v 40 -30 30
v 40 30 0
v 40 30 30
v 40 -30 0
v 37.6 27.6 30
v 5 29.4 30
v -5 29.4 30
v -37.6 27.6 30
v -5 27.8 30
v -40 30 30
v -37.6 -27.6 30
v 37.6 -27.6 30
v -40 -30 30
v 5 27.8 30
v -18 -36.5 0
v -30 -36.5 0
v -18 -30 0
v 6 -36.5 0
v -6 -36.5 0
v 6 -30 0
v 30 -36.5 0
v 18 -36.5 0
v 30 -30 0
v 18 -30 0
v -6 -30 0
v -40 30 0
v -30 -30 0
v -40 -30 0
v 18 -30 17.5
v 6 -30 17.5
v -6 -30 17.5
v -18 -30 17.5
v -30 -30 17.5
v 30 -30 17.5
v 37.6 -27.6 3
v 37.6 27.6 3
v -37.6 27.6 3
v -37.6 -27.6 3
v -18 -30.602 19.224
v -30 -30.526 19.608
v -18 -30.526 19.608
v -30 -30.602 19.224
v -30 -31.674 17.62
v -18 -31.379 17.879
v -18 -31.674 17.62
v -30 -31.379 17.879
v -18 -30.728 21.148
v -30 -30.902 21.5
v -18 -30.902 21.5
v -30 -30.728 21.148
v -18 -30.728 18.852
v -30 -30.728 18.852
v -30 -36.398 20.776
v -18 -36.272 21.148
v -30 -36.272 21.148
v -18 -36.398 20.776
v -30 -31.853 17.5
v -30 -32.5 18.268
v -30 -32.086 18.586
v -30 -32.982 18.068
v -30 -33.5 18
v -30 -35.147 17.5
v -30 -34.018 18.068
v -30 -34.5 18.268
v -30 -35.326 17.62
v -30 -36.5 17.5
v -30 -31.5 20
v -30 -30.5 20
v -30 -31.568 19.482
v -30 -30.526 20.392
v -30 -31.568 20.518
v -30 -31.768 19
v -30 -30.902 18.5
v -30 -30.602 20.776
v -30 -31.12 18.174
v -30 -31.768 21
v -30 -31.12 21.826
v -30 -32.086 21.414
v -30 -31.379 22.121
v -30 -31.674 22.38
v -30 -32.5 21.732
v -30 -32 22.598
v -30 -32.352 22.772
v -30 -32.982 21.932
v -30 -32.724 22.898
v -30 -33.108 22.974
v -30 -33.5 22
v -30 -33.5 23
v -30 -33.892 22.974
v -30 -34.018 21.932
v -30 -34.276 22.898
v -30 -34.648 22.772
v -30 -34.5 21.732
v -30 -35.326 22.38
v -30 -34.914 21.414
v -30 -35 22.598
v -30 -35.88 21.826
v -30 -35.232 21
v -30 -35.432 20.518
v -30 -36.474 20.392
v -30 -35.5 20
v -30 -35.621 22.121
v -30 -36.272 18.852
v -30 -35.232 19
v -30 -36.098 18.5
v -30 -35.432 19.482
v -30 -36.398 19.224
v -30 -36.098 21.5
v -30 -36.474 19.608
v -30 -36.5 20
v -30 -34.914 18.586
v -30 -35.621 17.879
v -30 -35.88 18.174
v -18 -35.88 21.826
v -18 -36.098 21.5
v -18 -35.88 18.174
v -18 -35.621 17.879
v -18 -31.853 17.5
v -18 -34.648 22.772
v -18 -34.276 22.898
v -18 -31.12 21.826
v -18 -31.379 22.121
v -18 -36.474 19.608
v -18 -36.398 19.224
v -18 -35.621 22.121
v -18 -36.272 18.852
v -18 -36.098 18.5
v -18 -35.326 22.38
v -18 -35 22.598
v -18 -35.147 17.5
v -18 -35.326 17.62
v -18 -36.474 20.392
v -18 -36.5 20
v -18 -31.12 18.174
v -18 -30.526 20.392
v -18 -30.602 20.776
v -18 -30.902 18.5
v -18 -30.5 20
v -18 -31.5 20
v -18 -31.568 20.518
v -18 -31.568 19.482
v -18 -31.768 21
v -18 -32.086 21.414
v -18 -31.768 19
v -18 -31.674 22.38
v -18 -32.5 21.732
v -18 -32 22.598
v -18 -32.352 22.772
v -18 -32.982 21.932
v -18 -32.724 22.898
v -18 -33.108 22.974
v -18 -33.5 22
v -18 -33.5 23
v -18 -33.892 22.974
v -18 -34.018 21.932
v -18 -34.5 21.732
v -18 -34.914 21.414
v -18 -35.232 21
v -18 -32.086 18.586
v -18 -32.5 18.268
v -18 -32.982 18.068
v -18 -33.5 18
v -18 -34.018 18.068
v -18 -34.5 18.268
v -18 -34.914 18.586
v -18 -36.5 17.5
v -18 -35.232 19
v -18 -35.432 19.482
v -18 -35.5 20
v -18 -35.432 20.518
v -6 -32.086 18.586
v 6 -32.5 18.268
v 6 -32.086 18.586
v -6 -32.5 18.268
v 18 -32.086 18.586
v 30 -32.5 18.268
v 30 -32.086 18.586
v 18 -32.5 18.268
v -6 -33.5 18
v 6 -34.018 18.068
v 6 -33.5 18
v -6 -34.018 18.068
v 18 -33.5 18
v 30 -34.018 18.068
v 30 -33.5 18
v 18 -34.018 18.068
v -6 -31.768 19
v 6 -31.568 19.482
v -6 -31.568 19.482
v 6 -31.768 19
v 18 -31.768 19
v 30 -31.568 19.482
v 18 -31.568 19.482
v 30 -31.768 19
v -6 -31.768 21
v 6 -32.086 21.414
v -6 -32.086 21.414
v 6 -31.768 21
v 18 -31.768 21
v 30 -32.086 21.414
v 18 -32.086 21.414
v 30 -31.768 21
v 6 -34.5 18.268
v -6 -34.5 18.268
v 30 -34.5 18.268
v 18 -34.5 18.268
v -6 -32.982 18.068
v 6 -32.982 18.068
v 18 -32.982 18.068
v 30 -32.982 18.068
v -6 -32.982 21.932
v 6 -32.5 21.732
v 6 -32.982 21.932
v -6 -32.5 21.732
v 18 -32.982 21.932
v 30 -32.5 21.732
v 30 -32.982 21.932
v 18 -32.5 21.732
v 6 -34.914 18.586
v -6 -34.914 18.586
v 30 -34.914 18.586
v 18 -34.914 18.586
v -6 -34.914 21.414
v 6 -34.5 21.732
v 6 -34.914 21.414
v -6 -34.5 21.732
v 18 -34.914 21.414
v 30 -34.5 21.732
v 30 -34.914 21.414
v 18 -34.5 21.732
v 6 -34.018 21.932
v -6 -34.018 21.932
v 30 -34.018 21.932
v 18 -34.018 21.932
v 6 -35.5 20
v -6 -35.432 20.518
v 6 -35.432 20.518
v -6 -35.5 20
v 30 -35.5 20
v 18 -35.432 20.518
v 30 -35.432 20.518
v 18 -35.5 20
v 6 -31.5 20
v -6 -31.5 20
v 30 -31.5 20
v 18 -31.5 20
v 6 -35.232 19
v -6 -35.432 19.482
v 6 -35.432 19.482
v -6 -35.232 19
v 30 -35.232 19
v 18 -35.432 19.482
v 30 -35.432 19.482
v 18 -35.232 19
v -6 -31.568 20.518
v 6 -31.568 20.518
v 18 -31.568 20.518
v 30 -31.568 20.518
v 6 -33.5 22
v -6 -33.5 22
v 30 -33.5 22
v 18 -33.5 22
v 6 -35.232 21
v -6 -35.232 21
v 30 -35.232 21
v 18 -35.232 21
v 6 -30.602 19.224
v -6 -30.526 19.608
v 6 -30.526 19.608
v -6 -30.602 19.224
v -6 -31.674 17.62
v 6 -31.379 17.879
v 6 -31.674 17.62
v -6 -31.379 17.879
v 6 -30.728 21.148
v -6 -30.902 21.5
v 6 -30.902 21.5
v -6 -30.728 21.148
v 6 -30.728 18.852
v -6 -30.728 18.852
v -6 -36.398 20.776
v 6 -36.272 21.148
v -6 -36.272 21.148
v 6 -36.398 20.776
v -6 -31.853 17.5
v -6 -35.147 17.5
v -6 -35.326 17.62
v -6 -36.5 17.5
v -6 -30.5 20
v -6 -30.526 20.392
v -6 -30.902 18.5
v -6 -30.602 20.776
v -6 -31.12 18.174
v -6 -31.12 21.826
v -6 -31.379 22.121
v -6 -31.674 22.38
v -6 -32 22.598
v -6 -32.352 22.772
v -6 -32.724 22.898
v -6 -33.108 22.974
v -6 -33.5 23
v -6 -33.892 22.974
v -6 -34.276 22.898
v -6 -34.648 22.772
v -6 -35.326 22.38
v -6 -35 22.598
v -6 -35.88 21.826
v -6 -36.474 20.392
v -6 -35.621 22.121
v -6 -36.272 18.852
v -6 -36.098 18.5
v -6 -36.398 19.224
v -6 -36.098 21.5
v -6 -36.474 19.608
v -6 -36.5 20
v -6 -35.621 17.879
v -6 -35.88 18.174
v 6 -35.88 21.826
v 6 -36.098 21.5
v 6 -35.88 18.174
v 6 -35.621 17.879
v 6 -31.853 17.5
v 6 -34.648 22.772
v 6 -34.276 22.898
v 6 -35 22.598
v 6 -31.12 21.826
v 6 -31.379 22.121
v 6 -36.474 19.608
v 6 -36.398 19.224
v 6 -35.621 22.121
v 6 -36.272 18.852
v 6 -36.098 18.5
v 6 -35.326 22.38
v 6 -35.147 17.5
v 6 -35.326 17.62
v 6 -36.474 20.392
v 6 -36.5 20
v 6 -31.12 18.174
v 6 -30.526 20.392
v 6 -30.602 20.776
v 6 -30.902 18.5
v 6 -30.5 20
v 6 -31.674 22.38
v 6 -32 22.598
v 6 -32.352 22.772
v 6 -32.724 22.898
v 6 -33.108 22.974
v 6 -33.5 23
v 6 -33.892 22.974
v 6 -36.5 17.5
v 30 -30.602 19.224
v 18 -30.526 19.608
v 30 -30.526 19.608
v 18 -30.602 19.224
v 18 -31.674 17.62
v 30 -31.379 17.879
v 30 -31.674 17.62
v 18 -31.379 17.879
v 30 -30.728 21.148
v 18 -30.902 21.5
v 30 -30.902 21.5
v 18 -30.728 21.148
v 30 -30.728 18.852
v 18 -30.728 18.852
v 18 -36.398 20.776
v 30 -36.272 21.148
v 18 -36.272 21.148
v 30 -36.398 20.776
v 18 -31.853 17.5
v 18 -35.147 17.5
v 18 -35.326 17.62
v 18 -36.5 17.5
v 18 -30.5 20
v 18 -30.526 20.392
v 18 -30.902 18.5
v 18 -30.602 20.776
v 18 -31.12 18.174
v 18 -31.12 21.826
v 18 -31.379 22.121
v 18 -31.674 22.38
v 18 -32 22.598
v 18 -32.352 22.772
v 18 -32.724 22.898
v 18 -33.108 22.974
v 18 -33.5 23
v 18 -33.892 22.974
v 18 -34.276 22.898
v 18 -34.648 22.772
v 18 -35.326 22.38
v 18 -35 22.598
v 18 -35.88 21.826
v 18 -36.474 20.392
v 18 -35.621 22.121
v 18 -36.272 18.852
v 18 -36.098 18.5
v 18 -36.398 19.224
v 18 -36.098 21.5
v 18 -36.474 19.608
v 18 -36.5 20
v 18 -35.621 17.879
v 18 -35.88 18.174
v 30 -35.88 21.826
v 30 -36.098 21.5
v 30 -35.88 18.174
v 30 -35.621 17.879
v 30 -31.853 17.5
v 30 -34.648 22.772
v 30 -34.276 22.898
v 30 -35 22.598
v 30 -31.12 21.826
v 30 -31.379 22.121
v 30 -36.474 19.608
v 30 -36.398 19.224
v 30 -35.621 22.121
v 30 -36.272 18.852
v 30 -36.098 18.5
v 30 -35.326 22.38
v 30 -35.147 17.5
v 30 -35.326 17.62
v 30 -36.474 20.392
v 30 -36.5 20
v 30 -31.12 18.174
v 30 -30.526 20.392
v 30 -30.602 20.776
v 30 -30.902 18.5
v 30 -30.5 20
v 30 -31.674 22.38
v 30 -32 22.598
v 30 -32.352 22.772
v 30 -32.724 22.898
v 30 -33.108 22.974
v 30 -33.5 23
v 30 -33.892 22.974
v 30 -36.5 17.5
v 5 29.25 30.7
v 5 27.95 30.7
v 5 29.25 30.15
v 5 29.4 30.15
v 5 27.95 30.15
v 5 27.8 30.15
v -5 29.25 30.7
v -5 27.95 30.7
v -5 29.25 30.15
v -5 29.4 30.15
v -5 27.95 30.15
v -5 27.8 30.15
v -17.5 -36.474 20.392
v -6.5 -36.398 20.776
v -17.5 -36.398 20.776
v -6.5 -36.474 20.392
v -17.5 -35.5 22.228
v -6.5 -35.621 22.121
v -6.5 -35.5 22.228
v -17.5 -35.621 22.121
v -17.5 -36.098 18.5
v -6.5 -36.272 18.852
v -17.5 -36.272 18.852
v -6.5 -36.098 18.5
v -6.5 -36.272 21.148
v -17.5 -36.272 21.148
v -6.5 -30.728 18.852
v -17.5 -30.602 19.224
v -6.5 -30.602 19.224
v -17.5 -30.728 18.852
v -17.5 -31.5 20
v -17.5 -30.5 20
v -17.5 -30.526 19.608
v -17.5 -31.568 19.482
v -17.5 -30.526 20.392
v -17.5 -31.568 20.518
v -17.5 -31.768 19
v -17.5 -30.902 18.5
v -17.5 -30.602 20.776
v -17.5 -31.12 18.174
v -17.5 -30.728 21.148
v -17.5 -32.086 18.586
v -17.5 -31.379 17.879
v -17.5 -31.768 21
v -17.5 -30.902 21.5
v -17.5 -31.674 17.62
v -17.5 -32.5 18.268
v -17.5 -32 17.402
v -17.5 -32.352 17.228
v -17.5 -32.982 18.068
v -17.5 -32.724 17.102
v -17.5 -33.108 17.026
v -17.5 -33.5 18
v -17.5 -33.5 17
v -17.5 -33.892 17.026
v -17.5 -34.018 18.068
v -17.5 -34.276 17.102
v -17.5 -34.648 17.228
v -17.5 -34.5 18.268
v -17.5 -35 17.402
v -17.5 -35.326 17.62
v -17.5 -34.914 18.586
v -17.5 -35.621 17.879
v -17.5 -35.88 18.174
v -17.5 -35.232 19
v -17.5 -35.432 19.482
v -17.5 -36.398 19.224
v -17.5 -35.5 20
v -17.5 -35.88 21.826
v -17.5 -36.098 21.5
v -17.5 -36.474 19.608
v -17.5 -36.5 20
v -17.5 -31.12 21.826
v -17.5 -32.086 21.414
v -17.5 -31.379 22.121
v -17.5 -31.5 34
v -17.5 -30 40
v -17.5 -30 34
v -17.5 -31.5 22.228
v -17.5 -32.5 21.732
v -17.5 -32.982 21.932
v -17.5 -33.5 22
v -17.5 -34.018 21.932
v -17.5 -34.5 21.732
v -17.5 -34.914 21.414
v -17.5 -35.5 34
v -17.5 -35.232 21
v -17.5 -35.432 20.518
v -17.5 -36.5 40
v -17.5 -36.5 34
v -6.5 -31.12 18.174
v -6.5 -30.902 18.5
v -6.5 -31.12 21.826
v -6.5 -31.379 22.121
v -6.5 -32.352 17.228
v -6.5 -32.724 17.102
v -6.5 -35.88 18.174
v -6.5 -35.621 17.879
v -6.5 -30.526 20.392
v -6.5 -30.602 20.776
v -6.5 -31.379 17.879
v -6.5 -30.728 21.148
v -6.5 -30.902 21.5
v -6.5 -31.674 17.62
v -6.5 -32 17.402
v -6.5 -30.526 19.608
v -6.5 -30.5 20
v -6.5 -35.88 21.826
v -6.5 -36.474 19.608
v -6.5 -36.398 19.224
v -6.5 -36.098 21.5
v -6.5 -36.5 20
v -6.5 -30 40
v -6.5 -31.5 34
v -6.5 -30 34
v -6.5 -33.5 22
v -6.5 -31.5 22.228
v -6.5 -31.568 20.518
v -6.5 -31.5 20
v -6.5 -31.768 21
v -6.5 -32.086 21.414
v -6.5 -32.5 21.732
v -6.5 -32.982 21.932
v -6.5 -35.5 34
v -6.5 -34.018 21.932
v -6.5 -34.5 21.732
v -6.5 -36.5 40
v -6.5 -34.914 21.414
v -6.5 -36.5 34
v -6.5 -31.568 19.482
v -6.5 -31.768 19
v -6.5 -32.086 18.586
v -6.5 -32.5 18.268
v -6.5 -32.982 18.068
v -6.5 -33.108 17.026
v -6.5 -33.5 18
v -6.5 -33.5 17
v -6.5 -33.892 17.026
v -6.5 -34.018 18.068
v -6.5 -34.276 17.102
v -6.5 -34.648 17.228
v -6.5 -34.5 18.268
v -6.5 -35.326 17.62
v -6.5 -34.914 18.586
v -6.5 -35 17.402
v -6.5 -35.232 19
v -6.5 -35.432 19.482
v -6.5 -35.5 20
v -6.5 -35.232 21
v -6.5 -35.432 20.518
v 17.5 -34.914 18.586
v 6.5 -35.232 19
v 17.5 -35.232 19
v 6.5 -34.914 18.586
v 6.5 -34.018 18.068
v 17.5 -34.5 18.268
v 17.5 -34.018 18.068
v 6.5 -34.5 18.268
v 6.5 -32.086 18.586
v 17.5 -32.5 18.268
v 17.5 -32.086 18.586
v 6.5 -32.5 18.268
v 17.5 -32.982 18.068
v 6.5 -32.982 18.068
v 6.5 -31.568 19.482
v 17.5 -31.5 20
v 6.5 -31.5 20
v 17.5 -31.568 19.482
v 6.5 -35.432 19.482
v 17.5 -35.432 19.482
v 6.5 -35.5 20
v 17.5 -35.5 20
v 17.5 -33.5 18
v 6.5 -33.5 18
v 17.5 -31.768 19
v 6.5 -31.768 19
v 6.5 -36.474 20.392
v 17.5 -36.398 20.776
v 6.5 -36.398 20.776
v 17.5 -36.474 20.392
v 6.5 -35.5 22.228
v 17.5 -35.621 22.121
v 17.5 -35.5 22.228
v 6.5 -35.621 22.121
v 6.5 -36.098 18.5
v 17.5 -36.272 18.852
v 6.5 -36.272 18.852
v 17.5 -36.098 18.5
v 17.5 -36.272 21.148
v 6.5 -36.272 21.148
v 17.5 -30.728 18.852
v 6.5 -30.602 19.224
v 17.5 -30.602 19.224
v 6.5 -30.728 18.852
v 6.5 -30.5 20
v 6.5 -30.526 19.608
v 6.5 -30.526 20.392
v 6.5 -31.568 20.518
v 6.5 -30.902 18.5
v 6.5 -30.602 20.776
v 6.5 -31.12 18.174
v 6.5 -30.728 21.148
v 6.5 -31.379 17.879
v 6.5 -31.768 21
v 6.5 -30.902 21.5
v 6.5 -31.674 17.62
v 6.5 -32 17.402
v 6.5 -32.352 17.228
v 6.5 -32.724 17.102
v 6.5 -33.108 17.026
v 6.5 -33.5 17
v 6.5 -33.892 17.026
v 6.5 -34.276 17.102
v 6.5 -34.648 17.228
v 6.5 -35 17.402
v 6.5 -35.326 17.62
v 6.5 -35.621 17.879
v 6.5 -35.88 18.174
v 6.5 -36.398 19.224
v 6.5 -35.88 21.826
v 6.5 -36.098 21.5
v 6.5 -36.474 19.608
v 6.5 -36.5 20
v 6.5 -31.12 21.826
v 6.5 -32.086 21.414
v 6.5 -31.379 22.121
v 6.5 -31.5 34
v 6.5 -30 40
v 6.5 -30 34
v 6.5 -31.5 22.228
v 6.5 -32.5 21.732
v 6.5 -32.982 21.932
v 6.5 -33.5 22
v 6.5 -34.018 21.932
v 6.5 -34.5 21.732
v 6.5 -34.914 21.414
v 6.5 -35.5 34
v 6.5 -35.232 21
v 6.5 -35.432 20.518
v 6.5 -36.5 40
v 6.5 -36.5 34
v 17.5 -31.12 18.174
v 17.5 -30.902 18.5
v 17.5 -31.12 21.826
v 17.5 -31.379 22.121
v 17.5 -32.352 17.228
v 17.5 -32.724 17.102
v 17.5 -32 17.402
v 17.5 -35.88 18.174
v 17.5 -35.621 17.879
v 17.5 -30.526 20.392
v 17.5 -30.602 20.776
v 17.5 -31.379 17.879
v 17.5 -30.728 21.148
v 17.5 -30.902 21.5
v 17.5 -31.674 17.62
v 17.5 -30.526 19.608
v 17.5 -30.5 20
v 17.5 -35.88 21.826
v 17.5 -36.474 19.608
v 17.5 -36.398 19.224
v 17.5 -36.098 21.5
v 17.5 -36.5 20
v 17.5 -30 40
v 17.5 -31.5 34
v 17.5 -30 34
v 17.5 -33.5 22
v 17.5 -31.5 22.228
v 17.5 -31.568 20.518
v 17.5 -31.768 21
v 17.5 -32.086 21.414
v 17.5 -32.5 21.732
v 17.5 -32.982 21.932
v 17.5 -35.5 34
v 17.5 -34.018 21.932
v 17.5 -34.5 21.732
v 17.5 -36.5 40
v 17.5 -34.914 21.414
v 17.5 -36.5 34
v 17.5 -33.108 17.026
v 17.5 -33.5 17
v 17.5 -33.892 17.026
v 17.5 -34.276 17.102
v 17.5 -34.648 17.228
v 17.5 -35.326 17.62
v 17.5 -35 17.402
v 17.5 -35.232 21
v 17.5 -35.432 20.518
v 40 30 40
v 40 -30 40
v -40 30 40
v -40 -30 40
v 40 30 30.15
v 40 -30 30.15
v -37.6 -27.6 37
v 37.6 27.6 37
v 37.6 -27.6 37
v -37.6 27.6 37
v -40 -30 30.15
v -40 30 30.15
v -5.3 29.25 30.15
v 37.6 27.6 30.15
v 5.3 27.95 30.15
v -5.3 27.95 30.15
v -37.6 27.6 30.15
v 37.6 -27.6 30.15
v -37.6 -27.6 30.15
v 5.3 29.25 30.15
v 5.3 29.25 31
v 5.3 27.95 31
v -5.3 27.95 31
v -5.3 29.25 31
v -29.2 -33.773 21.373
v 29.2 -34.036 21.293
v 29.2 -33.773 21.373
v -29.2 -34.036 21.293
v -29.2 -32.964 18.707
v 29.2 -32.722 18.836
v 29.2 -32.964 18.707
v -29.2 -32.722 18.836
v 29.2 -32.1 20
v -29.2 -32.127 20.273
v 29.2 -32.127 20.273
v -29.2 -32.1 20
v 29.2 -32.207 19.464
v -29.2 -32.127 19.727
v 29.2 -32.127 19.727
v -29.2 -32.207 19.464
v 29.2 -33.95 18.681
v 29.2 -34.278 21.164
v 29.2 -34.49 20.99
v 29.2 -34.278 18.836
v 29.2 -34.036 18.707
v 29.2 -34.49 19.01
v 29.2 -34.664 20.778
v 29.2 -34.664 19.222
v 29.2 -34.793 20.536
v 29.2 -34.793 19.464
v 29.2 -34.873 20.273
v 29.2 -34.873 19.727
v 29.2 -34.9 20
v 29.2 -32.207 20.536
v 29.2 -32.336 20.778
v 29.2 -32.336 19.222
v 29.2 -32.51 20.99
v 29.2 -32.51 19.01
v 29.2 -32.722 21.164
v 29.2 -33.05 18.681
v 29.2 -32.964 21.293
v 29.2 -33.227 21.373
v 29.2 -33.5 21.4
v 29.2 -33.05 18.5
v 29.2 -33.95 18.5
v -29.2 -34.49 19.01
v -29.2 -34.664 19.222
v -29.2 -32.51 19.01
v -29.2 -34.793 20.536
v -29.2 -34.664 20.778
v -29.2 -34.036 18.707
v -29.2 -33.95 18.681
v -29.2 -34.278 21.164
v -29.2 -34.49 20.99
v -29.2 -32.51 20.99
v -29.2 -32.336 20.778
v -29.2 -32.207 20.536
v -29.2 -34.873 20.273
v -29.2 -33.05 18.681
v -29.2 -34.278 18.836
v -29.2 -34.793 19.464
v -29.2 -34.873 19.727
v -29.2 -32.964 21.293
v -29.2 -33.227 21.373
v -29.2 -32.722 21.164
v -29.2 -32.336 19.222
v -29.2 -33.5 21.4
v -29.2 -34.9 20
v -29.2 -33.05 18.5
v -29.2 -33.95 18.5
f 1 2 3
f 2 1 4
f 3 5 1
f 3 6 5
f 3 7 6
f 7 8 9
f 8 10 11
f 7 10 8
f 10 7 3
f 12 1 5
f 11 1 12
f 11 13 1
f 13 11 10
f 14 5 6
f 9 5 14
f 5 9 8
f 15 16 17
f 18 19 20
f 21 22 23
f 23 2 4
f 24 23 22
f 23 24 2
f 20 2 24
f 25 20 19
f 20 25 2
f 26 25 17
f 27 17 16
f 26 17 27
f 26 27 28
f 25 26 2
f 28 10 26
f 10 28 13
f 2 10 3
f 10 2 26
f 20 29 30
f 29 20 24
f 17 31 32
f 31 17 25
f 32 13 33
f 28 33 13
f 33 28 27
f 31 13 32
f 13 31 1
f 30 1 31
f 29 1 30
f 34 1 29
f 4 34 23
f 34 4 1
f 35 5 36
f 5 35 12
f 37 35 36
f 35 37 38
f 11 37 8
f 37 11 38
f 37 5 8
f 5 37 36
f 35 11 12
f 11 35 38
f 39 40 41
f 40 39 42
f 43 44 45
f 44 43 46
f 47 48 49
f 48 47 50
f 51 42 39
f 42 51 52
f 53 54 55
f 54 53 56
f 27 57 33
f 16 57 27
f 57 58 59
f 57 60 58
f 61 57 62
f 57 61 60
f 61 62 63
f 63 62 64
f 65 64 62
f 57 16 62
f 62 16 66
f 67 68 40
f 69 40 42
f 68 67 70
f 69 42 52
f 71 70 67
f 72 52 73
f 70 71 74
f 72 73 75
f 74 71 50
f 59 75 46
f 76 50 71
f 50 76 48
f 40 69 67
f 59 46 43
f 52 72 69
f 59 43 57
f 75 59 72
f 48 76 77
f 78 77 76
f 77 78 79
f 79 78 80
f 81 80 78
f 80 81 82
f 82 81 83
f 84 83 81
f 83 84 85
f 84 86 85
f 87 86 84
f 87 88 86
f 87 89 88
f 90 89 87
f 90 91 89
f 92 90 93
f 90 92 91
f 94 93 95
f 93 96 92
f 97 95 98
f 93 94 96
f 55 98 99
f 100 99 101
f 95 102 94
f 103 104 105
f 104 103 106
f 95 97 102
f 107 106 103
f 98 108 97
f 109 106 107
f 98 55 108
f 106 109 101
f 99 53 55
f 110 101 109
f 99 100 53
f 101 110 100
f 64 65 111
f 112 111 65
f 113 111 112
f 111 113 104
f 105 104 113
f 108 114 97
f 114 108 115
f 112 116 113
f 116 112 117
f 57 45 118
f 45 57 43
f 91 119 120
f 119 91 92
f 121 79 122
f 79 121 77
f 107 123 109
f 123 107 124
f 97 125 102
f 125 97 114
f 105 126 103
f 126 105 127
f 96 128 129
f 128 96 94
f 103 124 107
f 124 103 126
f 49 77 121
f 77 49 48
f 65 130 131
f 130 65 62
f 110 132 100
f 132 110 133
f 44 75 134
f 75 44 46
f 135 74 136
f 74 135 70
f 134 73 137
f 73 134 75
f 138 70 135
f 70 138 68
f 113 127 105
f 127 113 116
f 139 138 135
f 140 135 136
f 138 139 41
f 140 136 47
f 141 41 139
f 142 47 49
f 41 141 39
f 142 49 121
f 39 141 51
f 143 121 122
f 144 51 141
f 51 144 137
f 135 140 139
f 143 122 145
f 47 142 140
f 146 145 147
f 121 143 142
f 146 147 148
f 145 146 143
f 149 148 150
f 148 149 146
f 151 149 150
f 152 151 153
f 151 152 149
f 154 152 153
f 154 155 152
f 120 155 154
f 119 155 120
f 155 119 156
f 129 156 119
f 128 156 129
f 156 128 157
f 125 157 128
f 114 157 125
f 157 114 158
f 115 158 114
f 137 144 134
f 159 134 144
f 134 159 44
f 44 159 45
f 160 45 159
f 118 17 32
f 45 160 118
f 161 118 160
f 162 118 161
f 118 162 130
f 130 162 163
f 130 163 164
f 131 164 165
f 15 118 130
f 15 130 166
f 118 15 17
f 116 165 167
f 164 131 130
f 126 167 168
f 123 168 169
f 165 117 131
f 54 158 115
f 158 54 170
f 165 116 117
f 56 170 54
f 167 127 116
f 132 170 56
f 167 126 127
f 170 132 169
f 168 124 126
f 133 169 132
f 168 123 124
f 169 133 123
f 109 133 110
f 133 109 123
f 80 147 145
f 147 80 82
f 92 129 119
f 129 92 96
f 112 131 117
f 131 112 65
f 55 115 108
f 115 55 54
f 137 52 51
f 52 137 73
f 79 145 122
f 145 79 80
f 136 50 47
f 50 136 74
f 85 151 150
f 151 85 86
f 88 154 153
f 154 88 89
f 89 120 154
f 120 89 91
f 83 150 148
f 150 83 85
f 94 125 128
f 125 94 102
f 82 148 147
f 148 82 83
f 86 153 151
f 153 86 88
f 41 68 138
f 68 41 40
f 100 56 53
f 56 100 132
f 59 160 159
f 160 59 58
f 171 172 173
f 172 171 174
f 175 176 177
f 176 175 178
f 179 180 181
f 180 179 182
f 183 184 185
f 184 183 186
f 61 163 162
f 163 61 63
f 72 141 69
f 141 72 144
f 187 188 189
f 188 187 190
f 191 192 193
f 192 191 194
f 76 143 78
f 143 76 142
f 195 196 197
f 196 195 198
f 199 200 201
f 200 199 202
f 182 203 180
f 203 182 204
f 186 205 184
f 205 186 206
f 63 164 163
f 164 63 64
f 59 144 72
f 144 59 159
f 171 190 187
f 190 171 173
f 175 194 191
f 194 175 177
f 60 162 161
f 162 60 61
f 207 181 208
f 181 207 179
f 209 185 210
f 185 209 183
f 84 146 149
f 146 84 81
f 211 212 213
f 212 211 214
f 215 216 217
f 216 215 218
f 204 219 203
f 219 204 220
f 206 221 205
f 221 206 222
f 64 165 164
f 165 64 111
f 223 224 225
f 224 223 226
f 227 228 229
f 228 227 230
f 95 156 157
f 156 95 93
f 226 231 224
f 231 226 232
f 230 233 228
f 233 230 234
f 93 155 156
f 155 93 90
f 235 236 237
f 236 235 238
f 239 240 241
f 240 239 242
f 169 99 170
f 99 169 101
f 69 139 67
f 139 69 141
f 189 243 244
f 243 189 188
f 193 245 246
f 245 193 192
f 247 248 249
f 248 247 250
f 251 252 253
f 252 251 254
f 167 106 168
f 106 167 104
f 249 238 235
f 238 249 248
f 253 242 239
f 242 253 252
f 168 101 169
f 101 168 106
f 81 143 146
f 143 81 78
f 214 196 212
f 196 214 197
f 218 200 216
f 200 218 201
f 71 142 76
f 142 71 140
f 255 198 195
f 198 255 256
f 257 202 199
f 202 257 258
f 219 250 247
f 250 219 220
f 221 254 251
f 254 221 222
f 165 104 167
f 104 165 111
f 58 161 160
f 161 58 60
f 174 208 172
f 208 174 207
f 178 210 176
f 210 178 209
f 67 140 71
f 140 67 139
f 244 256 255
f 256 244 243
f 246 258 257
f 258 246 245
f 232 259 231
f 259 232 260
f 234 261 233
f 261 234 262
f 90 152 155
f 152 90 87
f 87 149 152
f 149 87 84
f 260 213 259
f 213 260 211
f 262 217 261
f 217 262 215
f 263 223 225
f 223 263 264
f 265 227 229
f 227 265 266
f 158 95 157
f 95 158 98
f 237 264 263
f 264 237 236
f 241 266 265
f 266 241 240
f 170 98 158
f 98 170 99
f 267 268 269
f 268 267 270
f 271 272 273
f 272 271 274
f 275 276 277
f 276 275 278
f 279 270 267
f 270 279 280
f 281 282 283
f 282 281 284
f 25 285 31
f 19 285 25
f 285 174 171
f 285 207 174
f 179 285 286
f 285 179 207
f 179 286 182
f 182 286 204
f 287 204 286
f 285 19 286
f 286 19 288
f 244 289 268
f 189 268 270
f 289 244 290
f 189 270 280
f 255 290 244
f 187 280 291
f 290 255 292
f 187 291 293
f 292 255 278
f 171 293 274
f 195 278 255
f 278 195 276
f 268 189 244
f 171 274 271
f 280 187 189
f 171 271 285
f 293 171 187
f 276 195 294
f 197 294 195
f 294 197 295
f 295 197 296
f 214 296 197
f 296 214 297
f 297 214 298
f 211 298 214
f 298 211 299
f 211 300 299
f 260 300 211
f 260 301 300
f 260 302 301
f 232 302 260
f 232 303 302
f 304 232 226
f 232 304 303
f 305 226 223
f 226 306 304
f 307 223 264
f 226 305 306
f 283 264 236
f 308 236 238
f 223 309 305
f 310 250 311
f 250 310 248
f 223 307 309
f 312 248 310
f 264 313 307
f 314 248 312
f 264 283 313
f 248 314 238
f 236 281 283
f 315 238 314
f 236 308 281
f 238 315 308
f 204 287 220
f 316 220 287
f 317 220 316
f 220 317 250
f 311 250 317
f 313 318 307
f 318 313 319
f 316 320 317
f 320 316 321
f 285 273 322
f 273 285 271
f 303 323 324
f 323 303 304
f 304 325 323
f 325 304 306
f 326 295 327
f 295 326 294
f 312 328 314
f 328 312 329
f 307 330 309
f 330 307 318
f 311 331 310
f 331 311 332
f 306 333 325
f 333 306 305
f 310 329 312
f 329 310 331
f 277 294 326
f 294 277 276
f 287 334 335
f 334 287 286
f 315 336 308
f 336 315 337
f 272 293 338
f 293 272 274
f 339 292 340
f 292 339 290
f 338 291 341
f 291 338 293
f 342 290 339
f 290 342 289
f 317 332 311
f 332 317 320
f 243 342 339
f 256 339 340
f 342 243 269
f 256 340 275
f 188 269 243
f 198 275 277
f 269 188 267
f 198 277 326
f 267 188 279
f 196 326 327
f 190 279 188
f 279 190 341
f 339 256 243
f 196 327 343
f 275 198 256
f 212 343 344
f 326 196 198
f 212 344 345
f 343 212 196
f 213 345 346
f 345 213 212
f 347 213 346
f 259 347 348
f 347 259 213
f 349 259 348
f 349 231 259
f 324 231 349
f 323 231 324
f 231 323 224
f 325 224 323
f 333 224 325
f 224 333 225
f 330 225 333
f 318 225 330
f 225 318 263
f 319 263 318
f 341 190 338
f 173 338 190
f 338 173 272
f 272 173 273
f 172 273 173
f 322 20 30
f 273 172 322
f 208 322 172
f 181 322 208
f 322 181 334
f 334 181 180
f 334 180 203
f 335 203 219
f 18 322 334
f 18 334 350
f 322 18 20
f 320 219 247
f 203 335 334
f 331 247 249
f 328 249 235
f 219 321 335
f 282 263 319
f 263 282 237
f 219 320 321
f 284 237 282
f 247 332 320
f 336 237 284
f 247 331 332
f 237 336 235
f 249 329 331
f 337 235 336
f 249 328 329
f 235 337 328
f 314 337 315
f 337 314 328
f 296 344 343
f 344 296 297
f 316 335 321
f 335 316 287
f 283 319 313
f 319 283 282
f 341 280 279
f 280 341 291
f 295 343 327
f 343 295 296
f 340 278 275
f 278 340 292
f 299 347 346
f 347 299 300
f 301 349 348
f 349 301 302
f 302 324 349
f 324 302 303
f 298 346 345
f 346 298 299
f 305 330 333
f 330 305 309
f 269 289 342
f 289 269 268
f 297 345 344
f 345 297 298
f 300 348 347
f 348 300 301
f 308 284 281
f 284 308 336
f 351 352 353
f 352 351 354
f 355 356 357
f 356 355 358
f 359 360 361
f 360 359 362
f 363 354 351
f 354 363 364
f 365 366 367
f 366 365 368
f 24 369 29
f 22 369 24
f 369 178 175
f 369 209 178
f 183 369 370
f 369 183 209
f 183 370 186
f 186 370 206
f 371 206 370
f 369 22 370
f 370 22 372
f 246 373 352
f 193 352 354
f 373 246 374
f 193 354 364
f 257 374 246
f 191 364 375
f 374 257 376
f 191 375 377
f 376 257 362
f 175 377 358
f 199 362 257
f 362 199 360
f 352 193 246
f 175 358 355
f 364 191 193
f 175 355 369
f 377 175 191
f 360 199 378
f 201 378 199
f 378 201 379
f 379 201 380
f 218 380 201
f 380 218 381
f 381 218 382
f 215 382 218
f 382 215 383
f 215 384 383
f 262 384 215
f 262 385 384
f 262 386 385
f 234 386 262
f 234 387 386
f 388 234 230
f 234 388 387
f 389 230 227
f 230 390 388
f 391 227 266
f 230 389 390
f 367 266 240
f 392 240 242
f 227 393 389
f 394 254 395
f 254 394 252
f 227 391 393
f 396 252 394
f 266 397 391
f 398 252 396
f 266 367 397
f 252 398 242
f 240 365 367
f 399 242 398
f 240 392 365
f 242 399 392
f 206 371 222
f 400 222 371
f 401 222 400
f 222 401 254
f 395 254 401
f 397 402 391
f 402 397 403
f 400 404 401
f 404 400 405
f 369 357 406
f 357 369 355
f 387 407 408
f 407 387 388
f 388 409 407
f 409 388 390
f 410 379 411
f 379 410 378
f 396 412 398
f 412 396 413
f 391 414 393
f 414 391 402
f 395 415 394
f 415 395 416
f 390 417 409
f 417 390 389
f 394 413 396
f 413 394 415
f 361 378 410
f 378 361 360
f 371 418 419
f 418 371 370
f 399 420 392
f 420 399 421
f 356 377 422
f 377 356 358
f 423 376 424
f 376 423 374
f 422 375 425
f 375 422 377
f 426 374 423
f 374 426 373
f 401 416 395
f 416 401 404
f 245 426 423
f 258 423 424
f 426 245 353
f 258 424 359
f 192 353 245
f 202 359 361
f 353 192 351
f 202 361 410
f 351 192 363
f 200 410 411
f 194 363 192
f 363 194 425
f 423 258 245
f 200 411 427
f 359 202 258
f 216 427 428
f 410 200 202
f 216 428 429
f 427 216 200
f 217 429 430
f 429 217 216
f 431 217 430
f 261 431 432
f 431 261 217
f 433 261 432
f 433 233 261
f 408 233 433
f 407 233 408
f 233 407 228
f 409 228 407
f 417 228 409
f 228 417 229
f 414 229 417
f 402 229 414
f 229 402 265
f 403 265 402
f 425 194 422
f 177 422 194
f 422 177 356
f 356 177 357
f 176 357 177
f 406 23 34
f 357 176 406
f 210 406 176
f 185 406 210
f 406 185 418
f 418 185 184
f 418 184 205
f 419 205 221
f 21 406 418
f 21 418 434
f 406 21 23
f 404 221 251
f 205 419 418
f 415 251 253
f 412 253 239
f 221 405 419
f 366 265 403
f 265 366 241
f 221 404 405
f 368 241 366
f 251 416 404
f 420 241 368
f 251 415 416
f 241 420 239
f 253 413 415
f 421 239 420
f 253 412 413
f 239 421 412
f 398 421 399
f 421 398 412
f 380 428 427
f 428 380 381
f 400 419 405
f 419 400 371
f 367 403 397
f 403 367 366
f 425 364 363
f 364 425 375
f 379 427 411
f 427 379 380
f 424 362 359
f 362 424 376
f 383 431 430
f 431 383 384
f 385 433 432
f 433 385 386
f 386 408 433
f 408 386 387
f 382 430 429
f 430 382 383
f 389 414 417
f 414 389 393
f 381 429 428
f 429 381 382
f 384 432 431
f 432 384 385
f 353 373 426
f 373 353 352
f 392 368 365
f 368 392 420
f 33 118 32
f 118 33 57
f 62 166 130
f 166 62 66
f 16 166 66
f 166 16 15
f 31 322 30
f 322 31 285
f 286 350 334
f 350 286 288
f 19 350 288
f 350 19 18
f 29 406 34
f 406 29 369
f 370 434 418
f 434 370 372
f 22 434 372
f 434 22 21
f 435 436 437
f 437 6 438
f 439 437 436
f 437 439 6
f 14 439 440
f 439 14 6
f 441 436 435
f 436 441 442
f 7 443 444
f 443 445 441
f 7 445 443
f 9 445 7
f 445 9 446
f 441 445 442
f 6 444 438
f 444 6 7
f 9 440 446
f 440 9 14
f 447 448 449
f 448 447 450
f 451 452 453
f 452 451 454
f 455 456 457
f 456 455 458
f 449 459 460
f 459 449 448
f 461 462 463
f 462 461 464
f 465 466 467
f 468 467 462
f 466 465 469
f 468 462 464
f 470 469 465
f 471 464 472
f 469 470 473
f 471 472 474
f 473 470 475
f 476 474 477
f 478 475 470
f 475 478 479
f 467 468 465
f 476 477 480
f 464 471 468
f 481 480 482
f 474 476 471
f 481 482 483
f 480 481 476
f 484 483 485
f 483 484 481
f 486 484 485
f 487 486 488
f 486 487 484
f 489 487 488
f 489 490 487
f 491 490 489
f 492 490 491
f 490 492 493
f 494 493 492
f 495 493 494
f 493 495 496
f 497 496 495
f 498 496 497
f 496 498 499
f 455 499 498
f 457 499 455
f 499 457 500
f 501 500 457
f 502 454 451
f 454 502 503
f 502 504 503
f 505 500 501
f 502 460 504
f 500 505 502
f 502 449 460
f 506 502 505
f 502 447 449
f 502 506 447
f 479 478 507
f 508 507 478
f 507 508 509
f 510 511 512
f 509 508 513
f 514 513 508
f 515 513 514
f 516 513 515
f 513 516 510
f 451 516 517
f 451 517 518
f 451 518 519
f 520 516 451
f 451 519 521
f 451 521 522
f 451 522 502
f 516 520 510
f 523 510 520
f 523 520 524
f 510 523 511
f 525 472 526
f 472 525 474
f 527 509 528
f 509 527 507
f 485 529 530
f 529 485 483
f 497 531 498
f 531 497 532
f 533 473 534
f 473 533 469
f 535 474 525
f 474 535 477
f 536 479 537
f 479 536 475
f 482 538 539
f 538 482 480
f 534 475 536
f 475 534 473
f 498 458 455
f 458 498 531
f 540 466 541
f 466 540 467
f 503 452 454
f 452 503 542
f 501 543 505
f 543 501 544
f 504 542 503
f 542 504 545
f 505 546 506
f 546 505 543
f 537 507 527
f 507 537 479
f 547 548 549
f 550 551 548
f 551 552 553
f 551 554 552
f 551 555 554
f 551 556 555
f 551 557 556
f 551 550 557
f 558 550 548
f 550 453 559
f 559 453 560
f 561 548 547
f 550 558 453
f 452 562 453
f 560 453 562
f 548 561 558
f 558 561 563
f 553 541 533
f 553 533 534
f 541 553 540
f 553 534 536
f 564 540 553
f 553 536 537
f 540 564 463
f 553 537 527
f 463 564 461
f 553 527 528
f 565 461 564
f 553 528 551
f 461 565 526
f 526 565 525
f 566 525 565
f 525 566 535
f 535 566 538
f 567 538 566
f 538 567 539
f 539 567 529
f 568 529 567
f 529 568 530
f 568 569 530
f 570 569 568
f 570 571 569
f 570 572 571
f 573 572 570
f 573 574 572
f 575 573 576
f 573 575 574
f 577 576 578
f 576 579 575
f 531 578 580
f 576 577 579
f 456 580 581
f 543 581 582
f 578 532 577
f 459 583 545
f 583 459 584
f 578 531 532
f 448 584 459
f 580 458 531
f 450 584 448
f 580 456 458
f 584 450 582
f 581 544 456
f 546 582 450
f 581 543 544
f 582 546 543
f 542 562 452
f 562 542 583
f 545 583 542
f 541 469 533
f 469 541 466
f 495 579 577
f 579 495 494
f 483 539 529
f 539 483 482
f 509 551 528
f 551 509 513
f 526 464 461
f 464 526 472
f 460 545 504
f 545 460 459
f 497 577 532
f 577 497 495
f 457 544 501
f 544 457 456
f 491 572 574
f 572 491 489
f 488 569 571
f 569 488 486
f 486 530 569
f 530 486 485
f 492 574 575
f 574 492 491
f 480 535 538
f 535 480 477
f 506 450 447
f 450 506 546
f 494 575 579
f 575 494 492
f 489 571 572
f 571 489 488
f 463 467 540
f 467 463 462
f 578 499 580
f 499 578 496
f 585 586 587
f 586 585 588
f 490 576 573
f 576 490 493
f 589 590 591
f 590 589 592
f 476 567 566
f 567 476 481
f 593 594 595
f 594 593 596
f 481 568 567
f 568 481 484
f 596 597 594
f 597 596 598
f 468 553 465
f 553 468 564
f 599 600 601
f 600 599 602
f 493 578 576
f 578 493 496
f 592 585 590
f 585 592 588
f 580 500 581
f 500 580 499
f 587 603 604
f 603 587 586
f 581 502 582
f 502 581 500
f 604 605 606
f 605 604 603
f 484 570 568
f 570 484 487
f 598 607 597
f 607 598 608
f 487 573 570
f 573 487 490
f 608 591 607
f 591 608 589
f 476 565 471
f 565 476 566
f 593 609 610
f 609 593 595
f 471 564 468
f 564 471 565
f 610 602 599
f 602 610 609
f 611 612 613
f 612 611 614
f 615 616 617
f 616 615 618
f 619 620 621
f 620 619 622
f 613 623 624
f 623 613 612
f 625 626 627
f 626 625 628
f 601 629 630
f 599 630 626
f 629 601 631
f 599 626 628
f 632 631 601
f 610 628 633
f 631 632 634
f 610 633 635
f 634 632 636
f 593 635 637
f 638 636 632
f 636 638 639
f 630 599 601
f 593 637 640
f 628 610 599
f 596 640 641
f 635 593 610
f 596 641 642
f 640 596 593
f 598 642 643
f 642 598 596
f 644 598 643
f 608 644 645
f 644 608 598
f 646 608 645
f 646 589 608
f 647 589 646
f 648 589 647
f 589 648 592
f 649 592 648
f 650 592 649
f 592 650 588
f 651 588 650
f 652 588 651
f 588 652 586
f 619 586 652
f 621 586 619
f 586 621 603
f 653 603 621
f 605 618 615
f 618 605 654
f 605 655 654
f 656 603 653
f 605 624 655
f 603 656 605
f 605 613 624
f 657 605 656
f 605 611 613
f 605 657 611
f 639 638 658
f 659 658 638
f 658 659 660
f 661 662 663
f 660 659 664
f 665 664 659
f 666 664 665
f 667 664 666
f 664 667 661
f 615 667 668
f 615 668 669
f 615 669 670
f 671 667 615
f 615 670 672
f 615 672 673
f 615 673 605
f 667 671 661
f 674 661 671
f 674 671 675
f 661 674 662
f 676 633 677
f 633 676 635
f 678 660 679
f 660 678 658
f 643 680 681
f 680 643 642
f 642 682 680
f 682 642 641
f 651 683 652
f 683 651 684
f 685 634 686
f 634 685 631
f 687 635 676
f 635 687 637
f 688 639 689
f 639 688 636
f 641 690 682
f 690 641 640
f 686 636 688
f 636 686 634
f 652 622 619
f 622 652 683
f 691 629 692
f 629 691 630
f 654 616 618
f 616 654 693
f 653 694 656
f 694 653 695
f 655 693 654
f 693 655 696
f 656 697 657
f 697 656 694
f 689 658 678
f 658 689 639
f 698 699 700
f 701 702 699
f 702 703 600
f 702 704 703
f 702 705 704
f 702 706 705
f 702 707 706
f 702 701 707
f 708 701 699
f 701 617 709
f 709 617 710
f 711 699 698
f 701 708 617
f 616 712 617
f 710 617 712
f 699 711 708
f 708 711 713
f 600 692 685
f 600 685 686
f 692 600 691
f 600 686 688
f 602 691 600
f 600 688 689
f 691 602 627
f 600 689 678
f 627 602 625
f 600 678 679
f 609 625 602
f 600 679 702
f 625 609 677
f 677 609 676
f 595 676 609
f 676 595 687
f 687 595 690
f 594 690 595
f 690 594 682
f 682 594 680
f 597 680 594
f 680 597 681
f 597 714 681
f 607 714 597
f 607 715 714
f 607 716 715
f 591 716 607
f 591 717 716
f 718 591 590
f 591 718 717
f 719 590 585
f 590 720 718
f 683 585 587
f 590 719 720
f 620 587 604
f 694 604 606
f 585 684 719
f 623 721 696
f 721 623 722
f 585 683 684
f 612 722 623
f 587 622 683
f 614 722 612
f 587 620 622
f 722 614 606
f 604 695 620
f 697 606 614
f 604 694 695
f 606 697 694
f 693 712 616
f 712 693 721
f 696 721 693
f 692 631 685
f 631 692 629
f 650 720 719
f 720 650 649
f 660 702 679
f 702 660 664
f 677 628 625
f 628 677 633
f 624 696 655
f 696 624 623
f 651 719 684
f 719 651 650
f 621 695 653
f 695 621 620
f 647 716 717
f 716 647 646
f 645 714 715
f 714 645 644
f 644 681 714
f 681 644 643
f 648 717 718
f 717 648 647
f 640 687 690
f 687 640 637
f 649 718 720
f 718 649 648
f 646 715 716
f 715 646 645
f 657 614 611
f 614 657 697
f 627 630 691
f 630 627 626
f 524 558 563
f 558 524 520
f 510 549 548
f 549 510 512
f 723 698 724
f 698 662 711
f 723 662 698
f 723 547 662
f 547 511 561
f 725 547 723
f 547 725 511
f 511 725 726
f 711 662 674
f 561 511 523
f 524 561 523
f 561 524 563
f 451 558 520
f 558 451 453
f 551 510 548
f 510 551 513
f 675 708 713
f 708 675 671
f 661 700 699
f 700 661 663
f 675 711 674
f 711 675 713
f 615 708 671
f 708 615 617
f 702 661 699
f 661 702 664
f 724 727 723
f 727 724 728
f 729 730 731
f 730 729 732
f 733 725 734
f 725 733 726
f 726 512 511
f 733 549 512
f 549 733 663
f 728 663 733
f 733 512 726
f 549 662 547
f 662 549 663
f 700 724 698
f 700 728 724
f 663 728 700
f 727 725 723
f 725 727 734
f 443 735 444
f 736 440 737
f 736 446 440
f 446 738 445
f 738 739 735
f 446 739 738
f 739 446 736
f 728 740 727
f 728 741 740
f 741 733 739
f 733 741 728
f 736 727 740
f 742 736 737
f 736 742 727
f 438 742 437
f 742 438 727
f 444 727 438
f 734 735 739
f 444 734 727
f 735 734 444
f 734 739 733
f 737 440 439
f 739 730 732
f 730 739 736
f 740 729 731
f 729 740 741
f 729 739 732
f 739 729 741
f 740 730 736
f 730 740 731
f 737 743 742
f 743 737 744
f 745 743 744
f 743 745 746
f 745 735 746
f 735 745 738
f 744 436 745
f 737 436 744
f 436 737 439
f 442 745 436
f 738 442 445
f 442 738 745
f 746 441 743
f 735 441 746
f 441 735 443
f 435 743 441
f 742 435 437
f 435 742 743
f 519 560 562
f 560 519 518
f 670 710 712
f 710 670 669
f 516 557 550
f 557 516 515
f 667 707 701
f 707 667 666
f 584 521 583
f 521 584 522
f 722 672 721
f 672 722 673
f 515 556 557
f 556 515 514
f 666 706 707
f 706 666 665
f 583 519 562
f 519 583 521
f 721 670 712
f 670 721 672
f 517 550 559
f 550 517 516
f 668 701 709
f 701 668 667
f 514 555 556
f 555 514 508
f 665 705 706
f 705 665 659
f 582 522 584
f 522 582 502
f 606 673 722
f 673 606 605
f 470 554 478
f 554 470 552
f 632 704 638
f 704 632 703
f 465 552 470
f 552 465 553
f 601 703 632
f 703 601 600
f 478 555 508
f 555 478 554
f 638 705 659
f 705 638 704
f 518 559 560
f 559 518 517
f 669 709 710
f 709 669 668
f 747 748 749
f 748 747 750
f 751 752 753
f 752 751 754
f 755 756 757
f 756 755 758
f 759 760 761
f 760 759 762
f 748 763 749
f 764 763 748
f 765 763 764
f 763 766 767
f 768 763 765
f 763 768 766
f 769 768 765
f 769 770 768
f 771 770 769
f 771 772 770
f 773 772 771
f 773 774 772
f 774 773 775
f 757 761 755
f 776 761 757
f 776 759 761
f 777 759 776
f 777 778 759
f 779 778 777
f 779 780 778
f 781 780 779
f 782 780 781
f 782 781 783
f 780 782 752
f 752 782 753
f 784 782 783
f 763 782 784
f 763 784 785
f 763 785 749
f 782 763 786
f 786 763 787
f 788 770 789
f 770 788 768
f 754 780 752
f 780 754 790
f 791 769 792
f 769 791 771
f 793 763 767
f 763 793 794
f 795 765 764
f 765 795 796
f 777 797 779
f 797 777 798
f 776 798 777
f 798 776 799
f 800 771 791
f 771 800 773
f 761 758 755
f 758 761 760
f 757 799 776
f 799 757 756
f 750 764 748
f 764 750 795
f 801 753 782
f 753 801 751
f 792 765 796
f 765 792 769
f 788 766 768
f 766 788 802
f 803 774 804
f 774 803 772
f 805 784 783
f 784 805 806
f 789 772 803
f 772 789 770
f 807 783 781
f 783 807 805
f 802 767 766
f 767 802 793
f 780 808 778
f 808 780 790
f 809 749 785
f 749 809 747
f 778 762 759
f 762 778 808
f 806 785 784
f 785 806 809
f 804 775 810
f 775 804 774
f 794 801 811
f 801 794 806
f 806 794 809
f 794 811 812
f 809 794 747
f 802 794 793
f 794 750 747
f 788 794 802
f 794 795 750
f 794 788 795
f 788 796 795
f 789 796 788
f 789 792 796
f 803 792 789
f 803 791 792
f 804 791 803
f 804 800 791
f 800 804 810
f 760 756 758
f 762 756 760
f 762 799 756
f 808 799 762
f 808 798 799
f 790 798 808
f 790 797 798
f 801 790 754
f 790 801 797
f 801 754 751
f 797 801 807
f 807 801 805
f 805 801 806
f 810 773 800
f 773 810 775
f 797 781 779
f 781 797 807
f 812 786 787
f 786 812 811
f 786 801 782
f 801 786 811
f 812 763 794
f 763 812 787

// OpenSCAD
part = "assembly"; // [base, lid, pin, assembly]
cadverify_only = "";
module instance(name, part, unit = 1) {
  echo(cadverify_instance = [name, part, unit]);
  if (cadverify_only == "" || cadverify_only == name) children();
}
Ya = -33.5; Za = 20; Kr = 3.0; Br = 2.0; Pr = 1.4;
BX = [[-30,-18],[-6,6],[18,30]];
LX = [[-17.5,-6.5],[6.5,17.5]];
module barrelX(x0, x1) {
  difference() {
    translate([0,Ya,Za]) rotate([0,90,0]) translate([0,0,(x0+x1)/2])
      cylinder(h=x1-x0, r=Kr, center=true, $fn=48);
    translate([0,Ya,Za]) rotate([0,90,0]) translate([0,0,(x0+x1)/2])
      cylinder(h=(x1-x0)+1.0, r=Br, center=true, $fn=24);
  }
}
module base_geom() {
  difference() {
    union() {
      difference() {
        translate([-40,-30,0]) cube([80,60,30]);
        translate([-37.6,-27.6,3]) cube([75.2,55.2,27.01]);
      }
      for (b=BX) {
        translate([b[0],-36.5,0]) cube([b[1]-b[0],6.5,17.5]);
        barrelX(b[0], b[1]);
      }
      translate([-5,27.8,30]) cube([10,1.6,0.7]);
    }
    translate([0,Ya,Za]) rotate([0,90,0]) translate([0,0,0])
      cylinder(h=62, r=Br, center=true, $fn=24);
  }
}
module lid_open() {
  difference() {
    union() {
      translate([-40,-97,0]) cube([80,60,3]);
      translate([-40,-97,3]) cube([80,2.4,6.85]);
      translate([-40,-39.4,3]) cube([80,2.4,6.85]);
      translate([-40,-97,3]) cube([2.4,60,6.85]);
      translate([37.6,-97,3]) cube([2.4,60,6.85]);
      for (b=LX) {
        translate([b[0],-39,0]) cube([b[1]-b[0],8.5,6]);
        translate([b[0],-35.5,3]) cube([b[1]-b[0],4,17.5]);
        barrelX(b[0], b[1]);
      }
    }
    translate([-5.3,-96.25,9.0]) cube([10.6,1.3,1.1]);
    translate([0,Ya,Za]) rotate([0,90,0]) translate([0,0,0])
      cylinder(h=62, r=Br, center=true, $fn=24);
  }
}
module pin_geom() {
  union() {
    translate([-29.2,0,1.5]) rotate([0,90,0])
      cylinder(h=58.4, r=Pr, center=false, $fn=32);
    translate([-29.2,-0.45,0]) cube([58.4,0.9,0.4]);
  }
}
module lid_closed() {
  translate([0,Ya,Za]) rotate([180,0,0]) translate([0,-Ya,-Za]) lid_open();
}
module pin_placed() {
  translate([0,Ya,Za-1.5]) pin_geom();
}
if (part=="base") {
  base_geom();
  echo(cadverify_spec=[
    ["bounds", [[-40,-36.5,0],[40,30,30.7]]],
    ["bodies", 1],
    ["support_faces", [["base","-z",4000]]],
    ["overhangs_allowed", [["hinge", [[-30,-37,16],[30,-30,24]]]]],
    ["copies", 1],
    ["details", [
      ["bottom","thickness",[0,0,-1],[0,0,1],3],
      ["cavity","void",[[-37.6,-27.6,3],[37.6,27.6,30]],0.9],
      ["knuckle","material",[[-30,-36.5,17],[-18,-30.5,23]],0.4],
      ["bore","hole",[-31,-33.5,20],[1,0,0],[[0,4.0],[10,4.0]]],
      ["catch","material",[[-5,27.8,30],[5,29.4,30.7]],0.6]
    ]]
  ]);
} else if (part=="lid") {
  lid_open();
  echo(cadverify_spec=[
    ["bounds", [[-40,-97,0],[40,-30.5,23]]],
    ["bodies", 1],
    ["support_faces", [["lid","-z",4000]]],
    ["overhangs_allowed", [["hinge", [[-30,-37,16],[30,-30,24]]]]],
    ["copies", 1],
    ["details", [
      ["plate","thickness",[0,-67,-1],[0,0,1],3],
      ["pocket","void",[[-37.6,-94.6,3],[37.6,-39.4,9.85]],0.9],
      ["knuckle","material",[[-17.5,-36.5,17],[-6.5,-30.5,23]],0.4],
      ["bore","hole",[-18,-33.5,20],[1,0,0],[[0,4.0],[9,4.0]]],
      ["notch","void",[[-5.3,-96.25,9.0],[5.3,-94.95,10.1]],0.9]
    ]]
  ]);
} else if (part=="pin") {
  pin_geom();
  echo(cadverify_spec=[
    ["bounds", [[-29.2,-1.4,0],[29.2,1.4,2.9]]],
    ["bodies", 1],
    ["support_faces", [["pin","-z",50]]],
    ["overhangs_allowed", [["pinFlankA", [[-29.3,-1.1,0.2],[29.3,-0.8,0.6]]],["pinFlankB", [[-29.3,0.8,0.2],[29.3,1.1,0.6]]]]],
    ["copies", 1],
    ["details", [
      ["shaft","thickness",[0,5,1.5],[0,-1,0],2.8],
      ["fin","thickness",[0,0,-1],[0,0,1],2.9]
    ]]
  ]);
} else {
  instance("base","base") base_geom();
  instance("lid","lid") lid_closed();
  instance("pin","pin") pin_placed();
  echo(cadverify_spec=[
    ["bounds", [[-40,-36.5,0],[40,30,40]]],
    ["support_faces", [["bed","-z",4000]]],
    ["allowed_interferences", [["base","lid","catch press"]]],
    ["motions", [["swing",["lid"],"rotate",[0,-33.5,20],[1,0,0],[0,180],["flex",[["lid","base",0.5,"catch entry"]]]]]],
    ["assembly_order", [[["base"],[0,0,0]],[["lid"],[0,0,1]],[["pin"],[-1,0,0]]]],
    ["print_in_place", 0.2],
    ["print_pose", [["swing",180]]],
    ["overhangs_allowed", [["hinge", [[-30,-37,16],[30,-30,24]]]]]
  ]);
}
